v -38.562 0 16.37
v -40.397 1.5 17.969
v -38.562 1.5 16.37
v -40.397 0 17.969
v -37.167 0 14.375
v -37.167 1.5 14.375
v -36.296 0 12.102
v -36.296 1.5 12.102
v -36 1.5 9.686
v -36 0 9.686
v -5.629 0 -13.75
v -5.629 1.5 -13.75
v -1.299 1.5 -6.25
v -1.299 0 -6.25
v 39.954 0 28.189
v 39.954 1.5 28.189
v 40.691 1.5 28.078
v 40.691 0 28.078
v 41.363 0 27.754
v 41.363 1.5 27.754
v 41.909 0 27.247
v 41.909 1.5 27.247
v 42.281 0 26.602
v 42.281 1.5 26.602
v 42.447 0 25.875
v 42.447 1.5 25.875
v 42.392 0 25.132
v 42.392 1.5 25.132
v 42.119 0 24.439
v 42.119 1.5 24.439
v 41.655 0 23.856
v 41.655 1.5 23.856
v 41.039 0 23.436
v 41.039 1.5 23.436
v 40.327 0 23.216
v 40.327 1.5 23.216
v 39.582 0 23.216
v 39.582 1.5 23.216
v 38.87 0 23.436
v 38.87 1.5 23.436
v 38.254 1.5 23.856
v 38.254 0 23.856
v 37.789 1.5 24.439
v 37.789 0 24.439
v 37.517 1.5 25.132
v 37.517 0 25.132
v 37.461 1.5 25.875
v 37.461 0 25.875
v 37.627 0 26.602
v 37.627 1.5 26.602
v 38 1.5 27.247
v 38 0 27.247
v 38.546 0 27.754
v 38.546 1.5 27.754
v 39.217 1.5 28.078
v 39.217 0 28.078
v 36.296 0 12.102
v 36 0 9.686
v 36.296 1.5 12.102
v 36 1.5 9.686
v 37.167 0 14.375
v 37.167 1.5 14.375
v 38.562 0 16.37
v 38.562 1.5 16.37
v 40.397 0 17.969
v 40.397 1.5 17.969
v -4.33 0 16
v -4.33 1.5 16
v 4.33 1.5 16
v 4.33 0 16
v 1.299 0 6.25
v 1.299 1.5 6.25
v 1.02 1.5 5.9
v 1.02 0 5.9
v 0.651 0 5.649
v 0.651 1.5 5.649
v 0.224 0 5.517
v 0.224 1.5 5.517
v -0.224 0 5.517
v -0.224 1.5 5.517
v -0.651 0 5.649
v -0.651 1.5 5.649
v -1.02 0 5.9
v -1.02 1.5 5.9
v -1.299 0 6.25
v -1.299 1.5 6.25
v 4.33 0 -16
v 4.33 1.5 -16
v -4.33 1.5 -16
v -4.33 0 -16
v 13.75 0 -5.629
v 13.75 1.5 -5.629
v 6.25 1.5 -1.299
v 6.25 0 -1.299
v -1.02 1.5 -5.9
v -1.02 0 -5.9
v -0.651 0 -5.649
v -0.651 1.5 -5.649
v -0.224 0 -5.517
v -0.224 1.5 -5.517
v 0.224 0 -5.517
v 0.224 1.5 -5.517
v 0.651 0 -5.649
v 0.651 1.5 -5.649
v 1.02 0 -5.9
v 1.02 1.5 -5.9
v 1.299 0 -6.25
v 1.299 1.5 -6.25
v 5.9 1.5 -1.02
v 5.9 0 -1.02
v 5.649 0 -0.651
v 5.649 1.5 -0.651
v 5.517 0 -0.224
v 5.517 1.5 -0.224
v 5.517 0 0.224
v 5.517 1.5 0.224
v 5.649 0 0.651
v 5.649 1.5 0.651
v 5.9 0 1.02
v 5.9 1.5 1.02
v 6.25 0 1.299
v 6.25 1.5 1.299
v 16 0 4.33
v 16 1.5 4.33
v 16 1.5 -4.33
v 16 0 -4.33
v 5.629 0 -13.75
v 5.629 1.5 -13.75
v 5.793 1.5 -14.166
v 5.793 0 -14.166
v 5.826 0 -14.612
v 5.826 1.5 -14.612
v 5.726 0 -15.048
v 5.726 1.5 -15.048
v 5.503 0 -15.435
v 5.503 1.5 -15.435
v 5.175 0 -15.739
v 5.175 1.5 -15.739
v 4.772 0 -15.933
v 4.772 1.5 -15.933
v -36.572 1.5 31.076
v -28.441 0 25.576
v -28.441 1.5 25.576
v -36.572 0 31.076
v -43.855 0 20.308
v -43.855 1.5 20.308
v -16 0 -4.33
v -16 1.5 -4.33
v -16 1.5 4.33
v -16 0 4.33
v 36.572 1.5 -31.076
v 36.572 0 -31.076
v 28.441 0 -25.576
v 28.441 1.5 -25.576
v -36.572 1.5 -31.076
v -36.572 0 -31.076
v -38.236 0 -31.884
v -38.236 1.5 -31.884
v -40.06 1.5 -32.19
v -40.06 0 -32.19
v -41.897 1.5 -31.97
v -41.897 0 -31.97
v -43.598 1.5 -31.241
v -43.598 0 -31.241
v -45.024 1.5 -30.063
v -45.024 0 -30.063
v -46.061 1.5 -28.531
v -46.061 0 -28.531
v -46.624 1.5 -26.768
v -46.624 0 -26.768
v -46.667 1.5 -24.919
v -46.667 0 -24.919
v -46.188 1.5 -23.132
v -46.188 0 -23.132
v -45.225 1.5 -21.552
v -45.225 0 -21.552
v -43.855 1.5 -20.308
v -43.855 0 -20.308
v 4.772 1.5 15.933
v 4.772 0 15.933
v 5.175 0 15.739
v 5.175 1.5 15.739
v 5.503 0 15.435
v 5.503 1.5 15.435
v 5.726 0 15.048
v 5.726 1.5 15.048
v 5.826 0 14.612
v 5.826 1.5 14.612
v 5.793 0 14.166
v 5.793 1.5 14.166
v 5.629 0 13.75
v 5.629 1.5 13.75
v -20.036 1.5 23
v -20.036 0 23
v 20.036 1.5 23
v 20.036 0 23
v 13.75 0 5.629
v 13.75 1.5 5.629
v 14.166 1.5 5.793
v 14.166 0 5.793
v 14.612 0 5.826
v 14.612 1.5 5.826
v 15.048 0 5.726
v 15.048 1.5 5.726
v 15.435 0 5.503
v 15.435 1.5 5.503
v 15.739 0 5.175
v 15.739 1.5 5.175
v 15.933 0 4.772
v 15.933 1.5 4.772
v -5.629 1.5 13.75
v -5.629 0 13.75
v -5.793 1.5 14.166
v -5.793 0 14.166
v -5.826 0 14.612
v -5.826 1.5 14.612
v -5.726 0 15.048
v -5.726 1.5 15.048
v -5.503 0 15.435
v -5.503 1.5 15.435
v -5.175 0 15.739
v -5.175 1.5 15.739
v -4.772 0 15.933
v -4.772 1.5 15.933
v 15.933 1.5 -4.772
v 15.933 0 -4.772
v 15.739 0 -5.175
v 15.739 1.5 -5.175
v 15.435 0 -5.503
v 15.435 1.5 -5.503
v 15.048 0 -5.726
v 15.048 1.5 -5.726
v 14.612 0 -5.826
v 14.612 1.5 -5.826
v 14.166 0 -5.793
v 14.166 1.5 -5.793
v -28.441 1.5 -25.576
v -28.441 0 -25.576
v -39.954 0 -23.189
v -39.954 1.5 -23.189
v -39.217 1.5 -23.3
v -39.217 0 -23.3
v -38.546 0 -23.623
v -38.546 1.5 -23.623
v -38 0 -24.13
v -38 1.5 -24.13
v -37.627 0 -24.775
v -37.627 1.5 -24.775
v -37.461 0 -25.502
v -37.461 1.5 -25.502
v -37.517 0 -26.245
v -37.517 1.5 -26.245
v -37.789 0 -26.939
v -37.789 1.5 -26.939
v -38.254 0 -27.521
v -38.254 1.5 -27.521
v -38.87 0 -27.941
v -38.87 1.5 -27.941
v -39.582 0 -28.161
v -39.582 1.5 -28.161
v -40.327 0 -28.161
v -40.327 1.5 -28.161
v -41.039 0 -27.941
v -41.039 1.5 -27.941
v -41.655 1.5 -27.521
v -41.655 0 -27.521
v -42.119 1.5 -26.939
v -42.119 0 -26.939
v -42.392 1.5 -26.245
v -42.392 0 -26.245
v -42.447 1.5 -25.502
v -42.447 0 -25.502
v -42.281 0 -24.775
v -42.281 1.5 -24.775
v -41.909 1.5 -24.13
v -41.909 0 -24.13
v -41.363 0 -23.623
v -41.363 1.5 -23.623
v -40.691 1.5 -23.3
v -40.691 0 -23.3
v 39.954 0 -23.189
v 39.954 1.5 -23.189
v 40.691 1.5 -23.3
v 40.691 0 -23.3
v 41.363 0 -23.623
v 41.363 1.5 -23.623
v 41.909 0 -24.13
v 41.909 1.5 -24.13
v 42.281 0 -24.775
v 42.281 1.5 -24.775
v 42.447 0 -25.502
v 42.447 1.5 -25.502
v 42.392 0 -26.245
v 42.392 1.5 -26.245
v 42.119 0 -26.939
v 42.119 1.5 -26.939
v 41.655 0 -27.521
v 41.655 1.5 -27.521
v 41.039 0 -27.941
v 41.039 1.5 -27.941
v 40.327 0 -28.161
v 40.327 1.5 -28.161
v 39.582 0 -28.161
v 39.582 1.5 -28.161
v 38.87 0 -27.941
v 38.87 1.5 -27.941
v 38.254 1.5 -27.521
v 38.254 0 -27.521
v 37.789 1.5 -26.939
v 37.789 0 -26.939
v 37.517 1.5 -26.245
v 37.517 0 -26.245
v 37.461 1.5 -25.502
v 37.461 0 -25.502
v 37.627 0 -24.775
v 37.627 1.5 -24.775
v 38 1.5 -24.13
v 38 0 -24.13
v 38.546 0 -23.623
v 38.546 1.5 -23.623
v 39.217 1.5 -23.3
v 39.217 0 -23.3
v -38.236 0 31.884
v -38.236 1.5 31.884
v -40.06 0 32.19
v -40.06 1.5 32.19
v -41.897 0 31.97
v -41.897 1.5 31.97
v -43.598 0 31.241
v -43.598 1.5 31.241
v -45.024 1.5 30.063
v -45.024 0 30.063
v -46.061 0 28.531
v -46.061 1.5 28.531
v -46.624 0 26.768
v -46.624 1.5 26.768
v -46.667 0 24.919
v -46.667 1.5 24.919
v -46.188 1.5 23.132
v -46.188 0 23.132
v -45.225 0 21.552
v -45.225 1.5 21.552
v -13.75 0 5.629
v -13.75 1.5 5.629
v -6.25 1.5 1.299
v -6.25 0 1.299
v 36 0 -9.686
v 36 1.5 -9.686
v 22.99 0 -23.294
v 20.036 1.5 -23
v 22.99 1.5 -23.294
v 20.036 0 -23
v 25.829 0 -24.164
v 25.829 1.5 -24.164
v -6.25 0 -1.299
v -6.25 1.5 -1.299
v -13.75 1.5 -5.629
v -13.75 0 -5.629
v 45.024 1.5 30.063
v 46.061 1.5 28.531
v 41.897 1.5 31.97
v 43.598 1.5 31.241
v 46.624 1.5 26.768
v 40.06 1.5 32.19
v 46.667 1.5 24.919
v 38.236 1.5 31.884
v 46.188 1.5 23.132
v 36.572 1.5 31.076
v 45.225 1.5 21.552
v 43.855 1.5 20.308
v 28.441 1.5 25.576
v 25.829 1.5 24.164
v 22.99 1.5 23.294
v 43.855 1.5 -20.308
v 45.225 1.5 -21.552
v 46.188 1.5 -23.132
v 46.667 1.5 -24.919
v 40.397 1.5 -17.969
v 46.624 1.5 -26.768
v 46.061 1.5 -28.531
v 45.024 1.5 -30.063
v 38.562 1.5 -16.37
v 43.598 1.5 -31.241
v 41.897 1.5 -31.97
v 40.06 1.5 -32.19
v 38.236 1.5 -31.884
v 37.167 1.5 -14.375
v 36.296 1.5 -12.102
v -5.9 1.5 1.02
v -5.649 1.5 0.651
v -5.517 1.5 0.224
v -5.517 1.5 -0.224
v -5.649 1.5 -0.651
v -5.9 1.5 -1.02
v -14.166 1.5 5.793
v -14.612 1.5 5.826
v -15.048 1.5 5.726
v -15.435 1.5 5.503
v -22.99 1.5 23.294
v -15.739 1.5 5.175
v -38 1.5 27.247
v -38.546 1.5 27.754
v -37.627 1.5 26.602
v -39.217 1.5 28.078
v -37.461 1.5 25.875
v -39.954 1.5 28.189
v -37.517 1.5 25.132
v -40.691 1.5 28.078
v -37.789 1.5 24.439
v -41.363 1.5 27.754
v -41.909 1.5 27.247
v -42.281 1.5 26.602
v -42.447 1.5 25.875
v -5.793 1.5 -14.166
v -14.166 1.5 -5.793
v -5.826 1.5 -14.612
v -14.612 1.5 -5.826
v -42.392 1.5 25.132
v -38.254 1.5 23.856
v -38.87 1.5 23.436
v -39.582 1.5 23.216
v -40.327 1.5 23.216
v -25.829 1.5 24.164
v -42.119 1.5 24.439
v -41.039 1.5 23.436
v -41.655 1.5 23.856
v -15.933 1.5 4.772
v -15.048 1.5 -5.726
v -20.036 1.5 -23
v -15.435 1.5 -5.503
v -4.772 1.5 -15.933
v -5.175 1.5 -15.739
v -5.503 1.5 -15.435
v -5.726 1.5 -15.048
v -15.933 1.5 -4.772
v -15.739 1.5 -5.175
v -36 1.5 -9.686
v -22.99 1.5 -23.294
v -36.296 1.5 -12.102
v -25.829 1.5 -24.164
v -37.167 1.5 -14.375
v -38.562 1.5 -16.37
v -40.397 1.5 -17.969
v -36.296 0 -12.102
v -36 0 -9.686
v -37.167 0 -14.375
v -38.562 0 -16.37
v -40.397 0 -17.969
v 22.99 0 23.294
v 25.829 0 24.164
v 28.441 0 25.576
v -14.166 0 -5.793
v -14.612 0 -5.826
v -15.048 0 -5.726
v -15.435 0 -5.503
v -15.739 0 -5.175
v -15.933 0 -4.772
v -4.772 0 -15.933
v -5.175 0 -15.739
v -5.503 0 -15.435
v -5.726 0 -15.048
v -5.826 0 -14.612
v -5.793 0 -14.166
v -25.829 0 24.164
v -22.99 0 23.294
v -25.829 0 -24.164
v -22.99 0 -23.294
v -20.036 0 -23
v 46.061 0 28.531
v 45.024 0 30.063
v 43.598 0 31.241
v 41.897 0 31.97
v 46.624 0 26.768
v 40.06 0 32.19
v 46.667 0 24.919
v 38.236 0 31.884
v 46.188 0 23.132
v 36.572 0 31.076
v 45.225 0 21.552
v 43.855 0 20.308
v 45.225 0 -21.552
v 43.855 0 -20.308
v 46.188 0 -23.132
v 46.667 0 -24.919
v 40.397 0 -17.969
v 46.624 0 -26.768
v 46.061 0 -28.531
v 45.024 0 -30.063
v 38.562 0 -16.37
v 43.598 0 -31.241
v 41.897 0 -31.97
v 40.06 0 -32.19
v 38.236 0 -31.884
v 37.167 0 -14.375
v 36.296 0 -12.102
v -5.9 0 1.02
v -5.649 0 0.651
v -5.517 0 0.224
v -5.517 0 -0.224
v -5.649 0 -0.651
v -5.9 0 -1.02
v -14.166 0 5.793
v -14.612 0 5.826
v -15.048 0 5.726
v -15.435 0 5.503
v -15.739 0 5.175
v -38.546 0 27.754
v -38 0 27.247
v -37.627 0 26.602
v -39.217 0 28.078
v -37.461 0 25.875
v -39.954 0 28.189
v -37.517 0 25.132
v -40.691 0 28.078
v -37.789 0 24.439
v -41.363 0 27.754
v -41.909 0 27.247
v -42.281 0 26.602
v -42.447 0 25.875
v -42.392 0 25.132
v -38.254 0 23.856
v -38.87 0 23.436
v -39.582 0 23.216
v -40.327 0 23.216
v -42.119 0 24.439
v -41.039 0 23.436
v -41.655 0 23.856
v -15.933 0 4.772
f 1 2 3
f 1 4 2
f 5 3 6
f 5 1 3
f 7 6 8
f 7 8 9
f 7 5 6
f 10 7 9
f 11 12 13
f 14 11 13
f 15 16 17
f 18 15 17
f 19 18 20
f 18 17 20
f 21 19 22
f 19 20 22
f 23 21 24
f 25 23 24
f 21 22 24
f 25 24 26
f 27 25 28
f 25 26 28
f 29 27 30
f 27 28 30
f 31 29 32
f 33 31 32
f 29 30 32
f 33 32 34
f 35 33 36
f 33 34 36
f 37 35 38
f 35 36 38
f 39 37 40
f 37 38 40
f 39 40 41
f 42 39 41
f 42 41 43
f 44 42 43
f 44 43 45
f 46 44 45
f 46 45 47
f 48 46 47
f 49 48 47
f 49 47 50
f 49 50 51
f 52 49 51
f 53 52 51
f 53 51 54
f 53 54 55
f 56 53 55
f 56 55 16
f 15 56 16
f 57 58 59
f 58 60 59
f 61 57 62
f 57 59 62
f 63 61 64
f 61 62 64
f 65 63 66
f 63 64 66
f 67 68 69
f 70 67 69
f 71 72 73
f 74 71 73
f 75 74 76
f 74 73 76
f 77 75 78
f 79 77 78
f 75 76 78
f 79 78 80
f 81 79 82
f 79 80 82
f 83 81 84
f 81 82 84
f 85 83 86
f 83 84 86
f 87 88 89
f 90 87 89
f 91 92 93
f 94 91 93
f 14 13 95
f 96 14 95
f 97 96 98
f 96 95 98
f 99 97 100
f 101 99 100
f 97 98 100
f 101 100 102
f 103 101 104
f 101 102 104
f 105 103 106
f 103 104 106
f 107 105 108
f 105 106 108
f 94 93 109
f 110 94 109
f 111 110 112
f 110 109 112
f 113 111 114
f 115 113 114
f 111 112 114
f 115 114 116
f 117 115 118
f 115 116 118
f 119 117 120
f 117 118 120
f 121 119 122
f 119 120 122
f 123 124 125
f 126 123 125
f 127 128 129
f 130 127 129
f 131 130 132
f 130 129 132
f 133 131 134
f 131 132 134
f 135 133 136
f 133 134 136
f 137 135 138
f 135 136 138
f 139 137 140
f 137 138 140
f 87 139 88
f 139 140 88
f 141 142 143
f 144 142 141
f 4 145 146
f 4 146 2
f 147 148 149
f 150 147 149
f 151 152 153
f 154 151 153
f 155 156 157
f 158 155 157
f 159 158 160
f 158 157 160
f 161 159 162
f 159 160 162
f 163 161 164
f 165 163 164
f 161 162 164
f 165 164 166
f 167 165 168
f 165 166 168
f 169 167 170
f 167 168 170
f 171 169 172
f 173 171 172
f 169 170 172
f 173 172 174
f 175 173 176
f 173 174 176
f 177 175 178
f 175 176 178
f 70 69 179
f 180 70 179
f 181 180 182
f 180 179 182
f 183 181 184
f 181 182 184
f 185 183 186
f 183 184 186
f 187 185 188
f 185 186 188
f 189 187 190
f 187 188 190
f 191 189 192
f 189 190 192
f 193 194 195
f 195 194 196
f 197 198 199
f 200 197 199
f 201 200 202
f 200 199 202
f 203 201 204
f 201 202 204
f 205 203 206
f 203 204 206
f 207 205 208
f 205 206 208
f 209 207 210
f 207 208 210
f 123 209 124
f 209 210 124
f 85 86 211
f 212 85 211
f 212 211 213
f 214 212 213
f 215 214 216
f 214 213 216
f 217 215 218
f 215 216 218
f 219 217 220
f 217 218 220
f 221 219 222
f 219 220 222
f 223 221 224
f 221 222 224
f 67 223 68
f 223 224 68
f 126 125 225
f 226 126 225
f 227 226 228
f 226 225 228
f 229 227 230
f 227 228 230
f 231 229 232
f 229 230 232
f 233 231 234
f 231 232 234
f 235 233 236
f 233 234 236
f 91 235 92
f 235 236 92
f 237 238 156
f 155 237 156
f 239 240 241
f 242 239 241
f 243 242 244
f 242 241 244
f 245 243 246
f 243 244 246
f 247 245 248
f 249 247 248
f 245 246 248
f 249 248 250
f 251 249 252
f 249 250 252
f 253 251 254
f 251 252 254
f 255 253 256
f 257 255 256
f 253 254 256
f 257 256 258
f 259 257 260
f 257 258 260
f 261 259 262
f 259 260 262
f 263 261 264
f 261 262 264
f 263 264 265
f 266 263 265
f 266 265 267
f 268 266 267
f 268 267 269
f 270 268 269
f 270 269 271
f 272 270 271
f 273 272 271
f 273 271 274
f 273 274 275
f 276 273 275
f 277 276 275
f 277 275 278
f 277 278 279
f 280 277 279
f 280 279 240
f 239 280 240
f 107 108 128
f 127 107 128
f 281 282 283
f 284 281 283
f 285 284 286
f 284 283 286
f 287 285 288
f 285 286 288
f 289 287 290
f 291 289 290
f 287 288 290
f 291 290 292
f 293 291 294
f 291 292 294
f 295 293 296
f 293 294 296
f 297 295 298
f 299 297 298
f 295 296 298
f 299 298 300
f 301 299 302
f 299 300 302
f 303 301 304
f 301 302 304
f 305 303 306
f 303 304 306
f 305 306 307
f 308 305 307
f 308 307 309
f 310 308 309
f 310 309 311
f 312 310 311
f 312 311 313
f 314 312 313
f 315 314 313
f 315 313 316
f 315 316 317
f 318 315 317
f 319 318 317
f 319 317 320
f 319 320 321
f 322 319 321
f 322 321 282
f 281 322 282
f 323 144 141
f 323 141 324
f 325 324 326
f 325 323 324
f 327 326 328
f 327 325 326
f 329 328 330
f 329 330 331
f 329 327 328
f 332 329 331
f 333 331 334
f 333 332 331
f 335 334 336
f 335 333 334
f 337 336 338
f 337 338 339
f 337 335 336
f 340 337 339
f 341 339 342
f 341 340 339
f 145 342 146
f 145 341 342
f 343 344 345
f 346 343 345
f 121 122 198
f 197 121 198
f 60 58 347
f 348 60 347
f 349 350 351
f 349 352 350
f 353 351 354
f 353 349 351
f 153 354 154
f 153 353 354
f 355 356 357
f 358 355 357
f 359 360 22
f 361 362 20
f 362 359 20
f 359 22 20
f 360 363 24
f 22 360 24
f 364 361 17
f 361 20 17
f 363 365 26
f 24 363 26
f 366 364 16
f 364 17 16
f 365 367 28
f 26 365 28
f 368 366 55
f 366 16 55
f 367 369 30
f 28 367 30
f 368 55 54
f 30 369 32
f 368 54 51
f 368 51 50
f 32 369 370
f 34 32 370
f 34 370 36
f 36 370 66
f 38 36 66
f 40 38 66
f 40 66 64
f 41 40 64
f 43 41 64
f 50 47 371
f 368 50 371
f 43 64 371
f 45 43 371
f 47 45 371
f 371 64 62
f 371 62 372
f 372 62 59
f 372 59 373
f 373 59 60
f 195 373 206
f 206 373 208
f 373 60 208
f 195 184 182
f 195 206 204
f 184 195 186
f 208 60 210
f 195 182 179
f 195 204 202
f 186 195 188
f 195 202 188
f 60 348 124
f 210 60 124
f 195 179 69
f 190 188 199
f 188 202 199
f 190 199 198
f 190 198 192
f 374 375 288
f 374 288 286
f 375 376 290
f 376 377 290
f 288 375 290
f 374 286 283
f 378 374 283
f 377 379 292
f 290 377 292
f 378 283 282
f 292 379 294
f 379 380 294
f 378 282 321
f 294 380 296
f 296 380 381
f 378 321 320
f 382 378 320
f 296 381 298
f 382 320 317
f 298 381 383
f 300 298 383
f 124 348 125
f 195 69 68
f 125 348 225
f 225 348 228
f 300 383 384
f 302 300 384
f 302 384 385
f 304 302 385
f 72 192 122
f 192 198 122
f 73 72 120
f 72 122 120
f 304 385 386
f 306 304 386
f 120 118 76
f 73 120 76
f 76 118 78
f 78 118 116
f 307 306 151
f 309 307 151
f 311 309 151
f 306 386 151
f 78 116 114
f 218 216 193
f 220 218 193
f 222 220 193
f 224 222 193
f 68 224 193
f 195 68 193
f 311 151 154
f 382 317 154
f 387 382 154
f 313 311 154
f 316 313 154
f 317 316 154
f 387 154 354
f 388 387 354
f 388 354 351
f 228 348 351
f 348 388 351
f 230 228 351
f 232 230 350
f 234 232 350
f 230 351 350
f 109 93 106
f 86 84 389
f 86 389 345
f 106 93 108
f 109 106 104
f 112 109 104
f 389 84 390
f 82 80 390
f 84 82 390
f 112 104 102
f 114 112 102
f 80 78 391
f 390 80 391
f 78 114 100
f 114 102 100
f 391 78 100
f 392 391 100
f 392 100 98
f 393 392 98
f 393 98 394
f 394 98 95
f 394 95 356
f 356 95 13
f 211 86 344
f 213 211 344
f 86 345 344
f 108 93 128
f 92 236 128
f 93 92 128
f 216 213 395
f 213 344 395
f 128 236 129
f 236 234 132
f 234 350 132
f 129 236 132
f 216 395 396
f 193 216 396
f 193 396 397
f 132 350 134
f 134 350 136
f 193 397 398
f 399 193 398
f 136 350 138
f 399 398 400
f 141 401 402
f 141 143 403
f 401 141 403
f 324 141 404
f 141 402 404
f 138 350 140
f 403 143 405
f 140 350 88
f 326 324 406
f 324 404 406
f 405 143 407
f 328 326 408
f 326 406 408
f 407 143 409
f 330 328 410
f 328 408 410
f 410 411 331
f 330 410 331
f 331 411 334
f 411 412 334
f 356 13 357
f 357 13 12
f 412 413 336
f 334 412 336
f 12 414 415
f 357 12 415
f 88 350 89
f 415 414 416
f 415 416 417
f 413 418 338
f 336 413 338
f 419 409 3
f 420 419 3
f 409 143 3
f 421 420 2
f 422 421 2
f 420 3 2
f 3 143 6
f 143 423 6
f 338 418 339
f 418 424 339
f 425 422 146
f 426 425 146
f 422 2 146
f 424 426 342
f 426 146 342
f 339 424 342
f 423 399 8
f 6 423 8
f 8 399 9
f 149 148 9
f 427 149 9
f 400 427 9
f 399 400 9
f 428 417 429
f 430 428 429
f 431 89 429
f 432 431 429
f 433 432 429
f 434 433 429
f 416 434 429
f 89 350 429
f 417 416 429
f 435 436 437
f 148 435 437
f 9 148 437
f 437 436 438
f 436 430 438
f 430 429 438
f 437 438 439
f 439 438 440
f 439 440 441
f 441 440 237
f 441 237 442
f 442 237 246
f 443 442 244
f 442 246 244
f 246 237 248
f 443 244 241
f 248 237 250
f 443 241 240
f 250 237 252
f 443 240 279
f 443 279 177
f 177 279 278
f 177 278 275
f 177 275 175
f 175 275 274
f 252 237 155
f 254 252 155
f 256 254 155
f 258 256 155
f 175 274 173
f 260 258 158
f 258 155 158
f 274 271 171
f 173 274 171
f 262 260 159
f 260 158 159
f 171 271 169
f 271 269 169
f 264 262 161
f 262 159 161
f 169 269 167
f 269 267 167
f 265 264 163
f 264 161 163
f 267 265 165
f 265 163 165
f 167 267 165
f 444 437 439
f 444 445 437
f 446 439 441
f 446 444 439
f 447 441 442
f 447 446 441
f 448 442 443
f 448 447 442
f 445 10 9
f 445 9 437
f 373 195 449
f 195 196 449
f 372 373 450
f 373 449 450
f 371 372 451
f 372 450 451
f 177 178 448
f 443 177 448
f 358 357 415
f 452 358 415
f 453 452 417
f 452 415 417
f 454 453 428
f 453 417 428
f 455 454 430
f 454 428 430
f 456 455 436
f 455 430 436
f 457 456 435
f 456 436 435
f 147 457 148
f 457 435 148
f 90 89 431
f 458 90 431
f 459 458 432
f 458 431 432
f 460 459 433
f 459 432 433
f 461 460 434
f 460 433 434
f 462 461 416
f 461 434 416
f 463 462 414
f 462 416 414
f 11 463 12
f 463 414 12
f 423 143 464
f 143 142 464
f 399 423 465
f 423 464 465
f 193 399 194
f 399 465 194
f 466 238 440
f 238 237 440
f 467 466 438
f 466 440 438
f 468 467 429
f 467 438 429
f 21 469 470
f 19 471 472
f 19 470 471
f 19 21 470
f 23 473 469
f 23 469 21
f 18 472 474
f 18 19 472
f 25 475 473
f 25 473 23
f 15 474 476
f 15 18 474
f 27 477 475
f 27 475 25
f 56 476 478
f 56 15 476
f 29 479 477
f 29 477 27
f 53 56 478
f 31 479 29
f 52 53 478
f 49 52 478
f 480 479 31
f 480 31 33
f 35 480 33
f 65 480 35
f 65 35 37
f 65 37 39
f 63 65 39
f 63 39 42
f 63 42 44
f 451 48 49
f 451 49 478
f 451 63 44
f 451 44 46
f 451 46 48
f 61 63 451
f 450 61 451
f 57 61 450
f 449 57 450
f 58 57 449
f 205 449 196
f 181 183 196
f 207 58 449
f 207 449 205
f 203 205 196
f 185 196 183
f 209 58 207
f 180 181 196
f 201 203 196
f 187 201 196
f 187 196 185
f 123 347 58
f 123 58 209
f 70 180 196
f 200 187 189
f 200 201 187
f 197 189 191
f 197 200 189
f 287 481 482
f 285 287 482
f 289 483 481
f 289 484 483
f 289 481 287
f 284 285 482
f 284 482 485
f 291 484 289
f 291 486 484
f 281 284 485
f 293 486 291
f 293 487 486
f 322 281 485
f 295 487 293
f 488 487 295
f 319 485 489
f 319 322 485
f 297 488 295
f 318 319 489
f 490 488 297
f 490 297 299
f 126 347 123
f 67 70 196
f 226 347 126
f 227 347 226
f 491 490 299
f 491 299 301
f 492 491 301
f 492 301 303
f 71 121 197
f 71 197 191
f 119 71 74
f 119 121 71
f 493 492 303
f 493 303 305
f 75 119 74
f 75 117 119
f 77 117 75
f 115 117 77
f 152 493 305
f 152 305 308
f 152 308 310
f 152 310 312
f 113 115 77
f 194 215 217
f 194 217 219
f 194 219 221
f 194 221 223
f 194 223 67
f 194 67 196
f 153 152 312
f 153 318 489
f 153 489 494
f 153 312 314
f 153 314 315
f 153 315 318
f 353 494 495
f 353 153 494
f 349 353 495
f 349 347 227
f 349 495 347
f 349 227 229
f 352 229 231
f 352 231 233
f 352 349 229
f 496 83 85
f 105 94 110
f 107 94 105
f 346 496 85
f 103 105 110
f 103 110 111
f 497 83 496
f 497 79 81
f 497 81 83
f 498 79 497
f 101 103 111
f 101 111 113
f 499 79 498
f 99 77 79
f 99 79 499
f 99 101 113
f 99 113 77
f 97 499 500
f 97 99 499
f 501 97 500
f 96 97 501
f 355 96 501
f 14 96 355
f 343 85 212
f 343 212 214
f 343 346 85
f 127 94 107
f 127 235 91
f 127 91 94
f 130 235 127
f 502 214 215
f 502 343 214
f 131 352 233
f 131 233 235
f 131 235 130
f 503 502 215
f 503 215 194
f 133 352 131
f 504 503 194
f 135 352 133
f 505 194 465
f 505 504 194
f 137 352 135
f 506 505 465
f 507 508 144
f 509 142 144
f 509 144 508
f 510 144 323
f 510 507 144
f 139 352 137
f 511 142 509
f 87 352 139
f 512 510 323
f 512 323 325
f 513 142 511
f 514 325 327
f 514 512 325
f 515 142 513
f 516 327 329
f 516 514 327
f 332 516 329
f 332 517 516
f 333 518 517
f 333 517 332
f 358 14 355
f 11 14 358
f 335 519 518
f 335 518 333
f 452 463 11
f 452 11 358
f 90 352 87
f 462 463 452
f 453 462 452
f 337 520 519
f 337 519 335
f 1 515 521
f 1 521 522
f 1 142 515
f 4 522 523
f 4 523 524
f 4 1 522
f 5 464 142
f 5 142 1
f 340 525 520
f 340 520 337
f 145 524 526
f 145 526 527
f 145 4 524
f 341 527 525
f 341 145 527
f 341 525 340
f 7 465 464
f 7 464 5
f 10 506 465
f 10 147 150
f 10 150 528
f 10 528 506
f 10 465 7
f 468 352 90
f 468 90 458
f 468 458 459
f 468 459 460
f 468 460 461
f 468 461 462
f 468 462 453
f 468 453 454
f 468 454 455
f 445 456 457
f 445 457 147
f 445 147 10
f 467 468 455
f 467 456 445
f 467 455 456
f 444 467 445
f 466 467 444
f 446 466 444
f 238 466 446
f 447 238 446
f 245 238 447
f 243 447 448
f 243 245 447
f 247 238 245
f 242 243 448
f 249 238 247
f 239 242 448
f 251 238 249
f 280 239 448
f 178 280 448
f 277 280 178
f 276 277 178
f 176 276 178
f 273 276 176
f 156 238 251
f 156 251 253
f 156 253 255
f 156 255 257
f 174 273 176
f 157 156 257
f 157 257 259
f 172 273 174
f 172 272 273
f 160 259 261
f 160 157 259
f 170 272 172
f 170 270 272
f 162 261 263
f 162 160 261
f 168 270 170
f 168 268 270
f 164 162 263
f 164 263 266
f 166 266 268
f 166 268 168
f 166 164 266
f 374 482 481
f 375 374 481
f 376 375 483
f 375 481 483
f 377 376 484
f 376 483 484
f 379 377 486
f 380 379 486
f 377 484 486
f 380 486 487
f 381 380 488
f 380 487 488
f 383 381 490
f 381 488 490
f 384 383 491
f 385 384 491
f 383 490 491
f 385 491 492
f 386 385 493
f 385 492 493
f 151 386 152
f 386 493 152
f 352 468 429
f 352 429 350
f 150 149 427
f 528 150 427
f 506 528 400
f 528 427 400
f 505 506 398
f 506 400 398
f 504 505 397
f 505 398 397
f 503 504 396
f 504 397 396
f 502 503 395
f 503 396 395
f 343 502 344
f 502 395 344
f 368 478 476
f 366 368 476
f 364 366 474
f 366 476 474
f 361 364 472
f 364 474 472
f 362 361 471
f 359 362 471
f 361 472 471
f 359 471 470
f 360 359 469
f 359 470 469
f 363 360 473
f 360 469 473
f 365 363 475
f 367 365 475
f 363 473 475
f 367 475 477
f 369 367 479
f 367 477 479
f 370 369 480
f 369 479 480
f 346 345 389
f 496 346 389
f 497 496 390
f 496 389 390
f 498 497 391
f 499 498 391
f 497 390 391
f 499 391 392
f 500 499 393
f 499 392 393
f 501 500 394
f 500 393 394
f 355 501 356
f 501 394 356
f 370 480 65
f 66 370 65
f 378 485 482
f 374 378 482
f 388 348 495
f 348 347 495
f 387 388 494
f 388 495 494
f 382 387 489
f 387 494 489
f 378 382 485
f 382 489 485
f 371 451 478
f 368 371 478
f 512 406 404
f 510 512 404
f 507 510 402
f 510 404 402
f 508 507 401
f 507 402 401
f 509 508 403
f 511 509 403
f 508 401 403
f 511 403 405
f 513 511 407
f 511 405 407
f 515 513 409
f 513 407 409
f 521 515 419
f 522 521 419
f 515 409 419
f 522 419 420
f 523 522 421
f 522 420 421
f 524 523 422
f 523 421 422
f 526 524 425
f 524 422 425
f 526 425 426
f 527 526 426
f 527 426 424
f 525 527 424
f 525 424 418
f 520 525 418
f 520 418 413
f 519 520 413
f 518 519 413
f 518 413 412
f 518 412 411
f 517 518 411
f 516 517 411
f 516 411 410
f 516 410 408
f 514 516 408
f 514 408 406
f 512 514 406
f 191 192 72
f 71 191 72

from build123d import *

# Parameters (mm, degrees)
SKETCH1_W           = 72
SKETCH1_H           = 46
BOSS_EXTRUDE1_DEPTH = 1.5
BOSS_EXTRUDE2_DEPTH = 1.5
FILLET1_R           = 10
FILLET2_R           = 15
SKETCH4_R           = 2.5
CUT_EXTRUDE1_DEPTH  = 57.751394231
CUT_EXTRUDE2_DEPTH  = 57.751394231


with BuildPart() as part:
    # Sketch1 → Boss-Extrude1 (new body)
    with BuildSketch(Plane(origin=(0, 0, 0), x_dir=(1, 0, 0), z_dir=(0, 1, 0))):
        Rectangle(SKETCH1_W, SKETCH1_H)
    extrude(amount=BOSS_EXTRUDE1_DEPTH)

    # Sketch2 → Boss-Extrude2 (add)
    with BuildSketch(Plane(origin=(0, 0, 0), x_dir=(-1, 0, 0), z_dir=(0, -1, 0))):
        with BuildLine():
            Line((43.855417409, -20.308053614), (27.33033513, -9.129656043))
            Line((27.33033513, -9.129656043), (20.046462909, -19.897441585))
            Line((20.046462909, -19.897441585), (36.571545189, -31.075839157))
            ThreePointArc((36.571545189, -31.075839157), (45.59737407, -29.333882496), (43.855417409, -20.308053614))
        make_face()
        with BuildLine():
            Line((43.855417409, 20.308053614), (27.867856538, 9.493262584))
            Line((27.867856538, 9.493262584), (20.583984318, 20.261048126))
            Line((20.583984318, 20.261048126), (36.571545189, 31.075839157))
            ThreePointArc((36.571545189, 31.075839157), (45.59737407, 29.333882496), (43.855417409, 20.308053614))
        make_face()
        with BuildLine():
            Line((-36.571545189, 31.075839157), (-20.303290898, 20.071172966))
            Line((-20.303290898, 20.071172966), (-27.587163118, 9.303387424))
            Line((-27.587163118, 9.303387424), (-43.855417409, 20.308053614))
            ThreePointArc((-43.855417409, 20.308053614), (-45.59737407, 29.333882496), (-36.571545189, 31.075839157))
        make_face()
        with BuildLine():
            Line((-43.855417409, -20.308053614), (-27.377969487, -9.161878321))
            Line((-27.377969487, -9.161878321), (-20.094097267, -19.929663863))
            Line((-20.094097267, -19.929663863), (-36.571545189, -31.075839157))
            ThreePointArc((-36.571545189, -31.075839157), (-45.59737407, -29.333882496), (-43.855417409, -20.308053614))
        make_face()
    extrude(amount=-BOSS_EXTRUDE2_DEPTH)

    # Fillet1
    fillet1_edges = [part.edges().sort_by_distance(p)[0] for p in [
        (36, 0.75, -14.994253816),
        (36, 0.75, 14.994253816),
        (-36, 0.75, -14.994253816),
        (-36, 0.75, 14.994253816),
    ]]
    fillet(fillet1_edges, radius=FILLET1_R)

    # Fillet2
    fillet2_edges = [part.edges().sort_by_distance(p)[0] for p in [
        (24.632990876, 0.75, -23),
        (24.632990876, 0.75, 23),
        (-24.632990876, 0.75, -23),
        (-24.632990876, 0.75, 23),
    ]]
    fillet(fillet2_edges, radius=FILLET2_R)

    # Sketch4 → Cut-Extrude1 (cut, through all)
    with BuildSketch(Plane(origin=(0, 1.5, 0), x_dir=(1, 0, 0), z_dir=(0, 1, 0))):
        with Locations(Location((-39.954311998, -25.688576308, 0), (0, 0, 270))):
            Circle(SKETCH4_R)
        with Locations(Location((39.954311998, 25.688576308, 0), (0, 0, 270))):
            Circle(SKETCH4_R)
        with Locations(Location((-39.954311998, 25.688576308, 0), (0, 0, 270))):
            Circle(SKETCH4_R)
        with Locations(Location((39.954311998, -25.688576308, 0), (0, 0, 270))):
            Circle(SKETCH4_R)
    extrude(amount=-CUT_EXTRUDE1_DEPTH, mode=Mode.SUBTRACT)

    # Sketch5 → Cut-Extrude2 (cut, through all)
    with BuildSketch(Plane(origin=(0, 1.5, 0), x_dir=(1, 0, 0), z_dir=(0, 1, 0))):
        with BuildLine():
            Line((1.299038106, 6.25), (5.629165125, 13.75))
            ThreePointArc((5.629165125, 13.75), (5.629165125, 15.25), (4.330127019, 16))
            Line((4.330127019, 16), (-4.330127019, 16))
            ThreePointArc((-4.330127019, 16), (-5.629165125, 15.25), (-5.629165125, 13.75))
            Line((-5.629165125, 13.75), (-1.299038106, 6.25))
            ThreePointArc((-1.299038106, 6.25), (0, 5.5), (1.299038106, 6.25))
        make_face()
        with BuildLine():
            Line((-1.299038106, -6.25), (-5.629165125, -13.75))
            ThreePointArc((-5.629165125, -13.75), (-5.629165125, -15.25), (-4.330127019, -16))
            Line((-4.330127019, -16), (4.330127019, -16))
            ThreePointArc((4.330127019, -16), (5.629165125, -15.25), (5.629165125, -13.75))
            Line((5.629165125, -13.75), (1.299038106, -6.25))
            ThreePointArc((1.299038106, -6.25), (0, -5.5), (-1.299038106, -6.25))
        make_face()
        with BuildLine():
            Line((-6.25, 1.299038106), (-13.75, 5.629165125))
            ThreePointArc((-13.75, 5.629165125), (-15.25, 5.629165125), (-16, 4.330127019))
            Line((-16, 4.330127019), (-16, -4.330127019))
            ThreePointArc((-16, -4.330127019), (-15.25, -5.629165125), (-13.75, -5.629165125))
            Line((-13.75, -5.629165125), (-6.25, -1.299038106))
            ThreePointArc((-6.25, -1.299038106), (-5.5, 0), (-6.25, 1.299038106))
        make_face()
        with BuildLine():
            Line((6.25, -1.299038106), (13.75, -5.629165125))
            ThreePointArc((13.75, -5.629165125), (15.25, -5.629165125), (16, -4.330127019))
            Line((16, -4.330127019), (16, 4.330127019))
            ThreePointArc((16, 4.330127019), (15.25, 5.629165125), (13.75, 5.629165125))
            Line((13.75, 5.629165125), (6.25, 1.299038106))
            ThreePointArc((6.25, 1.299038106), (5.5, 0), (6.25, -1.299038106))
        make_face()
    extrude(amount=-CUT_EXTRUDE2_DEPTH, mode=Mode.SUBTRACT)


solid = part.part
